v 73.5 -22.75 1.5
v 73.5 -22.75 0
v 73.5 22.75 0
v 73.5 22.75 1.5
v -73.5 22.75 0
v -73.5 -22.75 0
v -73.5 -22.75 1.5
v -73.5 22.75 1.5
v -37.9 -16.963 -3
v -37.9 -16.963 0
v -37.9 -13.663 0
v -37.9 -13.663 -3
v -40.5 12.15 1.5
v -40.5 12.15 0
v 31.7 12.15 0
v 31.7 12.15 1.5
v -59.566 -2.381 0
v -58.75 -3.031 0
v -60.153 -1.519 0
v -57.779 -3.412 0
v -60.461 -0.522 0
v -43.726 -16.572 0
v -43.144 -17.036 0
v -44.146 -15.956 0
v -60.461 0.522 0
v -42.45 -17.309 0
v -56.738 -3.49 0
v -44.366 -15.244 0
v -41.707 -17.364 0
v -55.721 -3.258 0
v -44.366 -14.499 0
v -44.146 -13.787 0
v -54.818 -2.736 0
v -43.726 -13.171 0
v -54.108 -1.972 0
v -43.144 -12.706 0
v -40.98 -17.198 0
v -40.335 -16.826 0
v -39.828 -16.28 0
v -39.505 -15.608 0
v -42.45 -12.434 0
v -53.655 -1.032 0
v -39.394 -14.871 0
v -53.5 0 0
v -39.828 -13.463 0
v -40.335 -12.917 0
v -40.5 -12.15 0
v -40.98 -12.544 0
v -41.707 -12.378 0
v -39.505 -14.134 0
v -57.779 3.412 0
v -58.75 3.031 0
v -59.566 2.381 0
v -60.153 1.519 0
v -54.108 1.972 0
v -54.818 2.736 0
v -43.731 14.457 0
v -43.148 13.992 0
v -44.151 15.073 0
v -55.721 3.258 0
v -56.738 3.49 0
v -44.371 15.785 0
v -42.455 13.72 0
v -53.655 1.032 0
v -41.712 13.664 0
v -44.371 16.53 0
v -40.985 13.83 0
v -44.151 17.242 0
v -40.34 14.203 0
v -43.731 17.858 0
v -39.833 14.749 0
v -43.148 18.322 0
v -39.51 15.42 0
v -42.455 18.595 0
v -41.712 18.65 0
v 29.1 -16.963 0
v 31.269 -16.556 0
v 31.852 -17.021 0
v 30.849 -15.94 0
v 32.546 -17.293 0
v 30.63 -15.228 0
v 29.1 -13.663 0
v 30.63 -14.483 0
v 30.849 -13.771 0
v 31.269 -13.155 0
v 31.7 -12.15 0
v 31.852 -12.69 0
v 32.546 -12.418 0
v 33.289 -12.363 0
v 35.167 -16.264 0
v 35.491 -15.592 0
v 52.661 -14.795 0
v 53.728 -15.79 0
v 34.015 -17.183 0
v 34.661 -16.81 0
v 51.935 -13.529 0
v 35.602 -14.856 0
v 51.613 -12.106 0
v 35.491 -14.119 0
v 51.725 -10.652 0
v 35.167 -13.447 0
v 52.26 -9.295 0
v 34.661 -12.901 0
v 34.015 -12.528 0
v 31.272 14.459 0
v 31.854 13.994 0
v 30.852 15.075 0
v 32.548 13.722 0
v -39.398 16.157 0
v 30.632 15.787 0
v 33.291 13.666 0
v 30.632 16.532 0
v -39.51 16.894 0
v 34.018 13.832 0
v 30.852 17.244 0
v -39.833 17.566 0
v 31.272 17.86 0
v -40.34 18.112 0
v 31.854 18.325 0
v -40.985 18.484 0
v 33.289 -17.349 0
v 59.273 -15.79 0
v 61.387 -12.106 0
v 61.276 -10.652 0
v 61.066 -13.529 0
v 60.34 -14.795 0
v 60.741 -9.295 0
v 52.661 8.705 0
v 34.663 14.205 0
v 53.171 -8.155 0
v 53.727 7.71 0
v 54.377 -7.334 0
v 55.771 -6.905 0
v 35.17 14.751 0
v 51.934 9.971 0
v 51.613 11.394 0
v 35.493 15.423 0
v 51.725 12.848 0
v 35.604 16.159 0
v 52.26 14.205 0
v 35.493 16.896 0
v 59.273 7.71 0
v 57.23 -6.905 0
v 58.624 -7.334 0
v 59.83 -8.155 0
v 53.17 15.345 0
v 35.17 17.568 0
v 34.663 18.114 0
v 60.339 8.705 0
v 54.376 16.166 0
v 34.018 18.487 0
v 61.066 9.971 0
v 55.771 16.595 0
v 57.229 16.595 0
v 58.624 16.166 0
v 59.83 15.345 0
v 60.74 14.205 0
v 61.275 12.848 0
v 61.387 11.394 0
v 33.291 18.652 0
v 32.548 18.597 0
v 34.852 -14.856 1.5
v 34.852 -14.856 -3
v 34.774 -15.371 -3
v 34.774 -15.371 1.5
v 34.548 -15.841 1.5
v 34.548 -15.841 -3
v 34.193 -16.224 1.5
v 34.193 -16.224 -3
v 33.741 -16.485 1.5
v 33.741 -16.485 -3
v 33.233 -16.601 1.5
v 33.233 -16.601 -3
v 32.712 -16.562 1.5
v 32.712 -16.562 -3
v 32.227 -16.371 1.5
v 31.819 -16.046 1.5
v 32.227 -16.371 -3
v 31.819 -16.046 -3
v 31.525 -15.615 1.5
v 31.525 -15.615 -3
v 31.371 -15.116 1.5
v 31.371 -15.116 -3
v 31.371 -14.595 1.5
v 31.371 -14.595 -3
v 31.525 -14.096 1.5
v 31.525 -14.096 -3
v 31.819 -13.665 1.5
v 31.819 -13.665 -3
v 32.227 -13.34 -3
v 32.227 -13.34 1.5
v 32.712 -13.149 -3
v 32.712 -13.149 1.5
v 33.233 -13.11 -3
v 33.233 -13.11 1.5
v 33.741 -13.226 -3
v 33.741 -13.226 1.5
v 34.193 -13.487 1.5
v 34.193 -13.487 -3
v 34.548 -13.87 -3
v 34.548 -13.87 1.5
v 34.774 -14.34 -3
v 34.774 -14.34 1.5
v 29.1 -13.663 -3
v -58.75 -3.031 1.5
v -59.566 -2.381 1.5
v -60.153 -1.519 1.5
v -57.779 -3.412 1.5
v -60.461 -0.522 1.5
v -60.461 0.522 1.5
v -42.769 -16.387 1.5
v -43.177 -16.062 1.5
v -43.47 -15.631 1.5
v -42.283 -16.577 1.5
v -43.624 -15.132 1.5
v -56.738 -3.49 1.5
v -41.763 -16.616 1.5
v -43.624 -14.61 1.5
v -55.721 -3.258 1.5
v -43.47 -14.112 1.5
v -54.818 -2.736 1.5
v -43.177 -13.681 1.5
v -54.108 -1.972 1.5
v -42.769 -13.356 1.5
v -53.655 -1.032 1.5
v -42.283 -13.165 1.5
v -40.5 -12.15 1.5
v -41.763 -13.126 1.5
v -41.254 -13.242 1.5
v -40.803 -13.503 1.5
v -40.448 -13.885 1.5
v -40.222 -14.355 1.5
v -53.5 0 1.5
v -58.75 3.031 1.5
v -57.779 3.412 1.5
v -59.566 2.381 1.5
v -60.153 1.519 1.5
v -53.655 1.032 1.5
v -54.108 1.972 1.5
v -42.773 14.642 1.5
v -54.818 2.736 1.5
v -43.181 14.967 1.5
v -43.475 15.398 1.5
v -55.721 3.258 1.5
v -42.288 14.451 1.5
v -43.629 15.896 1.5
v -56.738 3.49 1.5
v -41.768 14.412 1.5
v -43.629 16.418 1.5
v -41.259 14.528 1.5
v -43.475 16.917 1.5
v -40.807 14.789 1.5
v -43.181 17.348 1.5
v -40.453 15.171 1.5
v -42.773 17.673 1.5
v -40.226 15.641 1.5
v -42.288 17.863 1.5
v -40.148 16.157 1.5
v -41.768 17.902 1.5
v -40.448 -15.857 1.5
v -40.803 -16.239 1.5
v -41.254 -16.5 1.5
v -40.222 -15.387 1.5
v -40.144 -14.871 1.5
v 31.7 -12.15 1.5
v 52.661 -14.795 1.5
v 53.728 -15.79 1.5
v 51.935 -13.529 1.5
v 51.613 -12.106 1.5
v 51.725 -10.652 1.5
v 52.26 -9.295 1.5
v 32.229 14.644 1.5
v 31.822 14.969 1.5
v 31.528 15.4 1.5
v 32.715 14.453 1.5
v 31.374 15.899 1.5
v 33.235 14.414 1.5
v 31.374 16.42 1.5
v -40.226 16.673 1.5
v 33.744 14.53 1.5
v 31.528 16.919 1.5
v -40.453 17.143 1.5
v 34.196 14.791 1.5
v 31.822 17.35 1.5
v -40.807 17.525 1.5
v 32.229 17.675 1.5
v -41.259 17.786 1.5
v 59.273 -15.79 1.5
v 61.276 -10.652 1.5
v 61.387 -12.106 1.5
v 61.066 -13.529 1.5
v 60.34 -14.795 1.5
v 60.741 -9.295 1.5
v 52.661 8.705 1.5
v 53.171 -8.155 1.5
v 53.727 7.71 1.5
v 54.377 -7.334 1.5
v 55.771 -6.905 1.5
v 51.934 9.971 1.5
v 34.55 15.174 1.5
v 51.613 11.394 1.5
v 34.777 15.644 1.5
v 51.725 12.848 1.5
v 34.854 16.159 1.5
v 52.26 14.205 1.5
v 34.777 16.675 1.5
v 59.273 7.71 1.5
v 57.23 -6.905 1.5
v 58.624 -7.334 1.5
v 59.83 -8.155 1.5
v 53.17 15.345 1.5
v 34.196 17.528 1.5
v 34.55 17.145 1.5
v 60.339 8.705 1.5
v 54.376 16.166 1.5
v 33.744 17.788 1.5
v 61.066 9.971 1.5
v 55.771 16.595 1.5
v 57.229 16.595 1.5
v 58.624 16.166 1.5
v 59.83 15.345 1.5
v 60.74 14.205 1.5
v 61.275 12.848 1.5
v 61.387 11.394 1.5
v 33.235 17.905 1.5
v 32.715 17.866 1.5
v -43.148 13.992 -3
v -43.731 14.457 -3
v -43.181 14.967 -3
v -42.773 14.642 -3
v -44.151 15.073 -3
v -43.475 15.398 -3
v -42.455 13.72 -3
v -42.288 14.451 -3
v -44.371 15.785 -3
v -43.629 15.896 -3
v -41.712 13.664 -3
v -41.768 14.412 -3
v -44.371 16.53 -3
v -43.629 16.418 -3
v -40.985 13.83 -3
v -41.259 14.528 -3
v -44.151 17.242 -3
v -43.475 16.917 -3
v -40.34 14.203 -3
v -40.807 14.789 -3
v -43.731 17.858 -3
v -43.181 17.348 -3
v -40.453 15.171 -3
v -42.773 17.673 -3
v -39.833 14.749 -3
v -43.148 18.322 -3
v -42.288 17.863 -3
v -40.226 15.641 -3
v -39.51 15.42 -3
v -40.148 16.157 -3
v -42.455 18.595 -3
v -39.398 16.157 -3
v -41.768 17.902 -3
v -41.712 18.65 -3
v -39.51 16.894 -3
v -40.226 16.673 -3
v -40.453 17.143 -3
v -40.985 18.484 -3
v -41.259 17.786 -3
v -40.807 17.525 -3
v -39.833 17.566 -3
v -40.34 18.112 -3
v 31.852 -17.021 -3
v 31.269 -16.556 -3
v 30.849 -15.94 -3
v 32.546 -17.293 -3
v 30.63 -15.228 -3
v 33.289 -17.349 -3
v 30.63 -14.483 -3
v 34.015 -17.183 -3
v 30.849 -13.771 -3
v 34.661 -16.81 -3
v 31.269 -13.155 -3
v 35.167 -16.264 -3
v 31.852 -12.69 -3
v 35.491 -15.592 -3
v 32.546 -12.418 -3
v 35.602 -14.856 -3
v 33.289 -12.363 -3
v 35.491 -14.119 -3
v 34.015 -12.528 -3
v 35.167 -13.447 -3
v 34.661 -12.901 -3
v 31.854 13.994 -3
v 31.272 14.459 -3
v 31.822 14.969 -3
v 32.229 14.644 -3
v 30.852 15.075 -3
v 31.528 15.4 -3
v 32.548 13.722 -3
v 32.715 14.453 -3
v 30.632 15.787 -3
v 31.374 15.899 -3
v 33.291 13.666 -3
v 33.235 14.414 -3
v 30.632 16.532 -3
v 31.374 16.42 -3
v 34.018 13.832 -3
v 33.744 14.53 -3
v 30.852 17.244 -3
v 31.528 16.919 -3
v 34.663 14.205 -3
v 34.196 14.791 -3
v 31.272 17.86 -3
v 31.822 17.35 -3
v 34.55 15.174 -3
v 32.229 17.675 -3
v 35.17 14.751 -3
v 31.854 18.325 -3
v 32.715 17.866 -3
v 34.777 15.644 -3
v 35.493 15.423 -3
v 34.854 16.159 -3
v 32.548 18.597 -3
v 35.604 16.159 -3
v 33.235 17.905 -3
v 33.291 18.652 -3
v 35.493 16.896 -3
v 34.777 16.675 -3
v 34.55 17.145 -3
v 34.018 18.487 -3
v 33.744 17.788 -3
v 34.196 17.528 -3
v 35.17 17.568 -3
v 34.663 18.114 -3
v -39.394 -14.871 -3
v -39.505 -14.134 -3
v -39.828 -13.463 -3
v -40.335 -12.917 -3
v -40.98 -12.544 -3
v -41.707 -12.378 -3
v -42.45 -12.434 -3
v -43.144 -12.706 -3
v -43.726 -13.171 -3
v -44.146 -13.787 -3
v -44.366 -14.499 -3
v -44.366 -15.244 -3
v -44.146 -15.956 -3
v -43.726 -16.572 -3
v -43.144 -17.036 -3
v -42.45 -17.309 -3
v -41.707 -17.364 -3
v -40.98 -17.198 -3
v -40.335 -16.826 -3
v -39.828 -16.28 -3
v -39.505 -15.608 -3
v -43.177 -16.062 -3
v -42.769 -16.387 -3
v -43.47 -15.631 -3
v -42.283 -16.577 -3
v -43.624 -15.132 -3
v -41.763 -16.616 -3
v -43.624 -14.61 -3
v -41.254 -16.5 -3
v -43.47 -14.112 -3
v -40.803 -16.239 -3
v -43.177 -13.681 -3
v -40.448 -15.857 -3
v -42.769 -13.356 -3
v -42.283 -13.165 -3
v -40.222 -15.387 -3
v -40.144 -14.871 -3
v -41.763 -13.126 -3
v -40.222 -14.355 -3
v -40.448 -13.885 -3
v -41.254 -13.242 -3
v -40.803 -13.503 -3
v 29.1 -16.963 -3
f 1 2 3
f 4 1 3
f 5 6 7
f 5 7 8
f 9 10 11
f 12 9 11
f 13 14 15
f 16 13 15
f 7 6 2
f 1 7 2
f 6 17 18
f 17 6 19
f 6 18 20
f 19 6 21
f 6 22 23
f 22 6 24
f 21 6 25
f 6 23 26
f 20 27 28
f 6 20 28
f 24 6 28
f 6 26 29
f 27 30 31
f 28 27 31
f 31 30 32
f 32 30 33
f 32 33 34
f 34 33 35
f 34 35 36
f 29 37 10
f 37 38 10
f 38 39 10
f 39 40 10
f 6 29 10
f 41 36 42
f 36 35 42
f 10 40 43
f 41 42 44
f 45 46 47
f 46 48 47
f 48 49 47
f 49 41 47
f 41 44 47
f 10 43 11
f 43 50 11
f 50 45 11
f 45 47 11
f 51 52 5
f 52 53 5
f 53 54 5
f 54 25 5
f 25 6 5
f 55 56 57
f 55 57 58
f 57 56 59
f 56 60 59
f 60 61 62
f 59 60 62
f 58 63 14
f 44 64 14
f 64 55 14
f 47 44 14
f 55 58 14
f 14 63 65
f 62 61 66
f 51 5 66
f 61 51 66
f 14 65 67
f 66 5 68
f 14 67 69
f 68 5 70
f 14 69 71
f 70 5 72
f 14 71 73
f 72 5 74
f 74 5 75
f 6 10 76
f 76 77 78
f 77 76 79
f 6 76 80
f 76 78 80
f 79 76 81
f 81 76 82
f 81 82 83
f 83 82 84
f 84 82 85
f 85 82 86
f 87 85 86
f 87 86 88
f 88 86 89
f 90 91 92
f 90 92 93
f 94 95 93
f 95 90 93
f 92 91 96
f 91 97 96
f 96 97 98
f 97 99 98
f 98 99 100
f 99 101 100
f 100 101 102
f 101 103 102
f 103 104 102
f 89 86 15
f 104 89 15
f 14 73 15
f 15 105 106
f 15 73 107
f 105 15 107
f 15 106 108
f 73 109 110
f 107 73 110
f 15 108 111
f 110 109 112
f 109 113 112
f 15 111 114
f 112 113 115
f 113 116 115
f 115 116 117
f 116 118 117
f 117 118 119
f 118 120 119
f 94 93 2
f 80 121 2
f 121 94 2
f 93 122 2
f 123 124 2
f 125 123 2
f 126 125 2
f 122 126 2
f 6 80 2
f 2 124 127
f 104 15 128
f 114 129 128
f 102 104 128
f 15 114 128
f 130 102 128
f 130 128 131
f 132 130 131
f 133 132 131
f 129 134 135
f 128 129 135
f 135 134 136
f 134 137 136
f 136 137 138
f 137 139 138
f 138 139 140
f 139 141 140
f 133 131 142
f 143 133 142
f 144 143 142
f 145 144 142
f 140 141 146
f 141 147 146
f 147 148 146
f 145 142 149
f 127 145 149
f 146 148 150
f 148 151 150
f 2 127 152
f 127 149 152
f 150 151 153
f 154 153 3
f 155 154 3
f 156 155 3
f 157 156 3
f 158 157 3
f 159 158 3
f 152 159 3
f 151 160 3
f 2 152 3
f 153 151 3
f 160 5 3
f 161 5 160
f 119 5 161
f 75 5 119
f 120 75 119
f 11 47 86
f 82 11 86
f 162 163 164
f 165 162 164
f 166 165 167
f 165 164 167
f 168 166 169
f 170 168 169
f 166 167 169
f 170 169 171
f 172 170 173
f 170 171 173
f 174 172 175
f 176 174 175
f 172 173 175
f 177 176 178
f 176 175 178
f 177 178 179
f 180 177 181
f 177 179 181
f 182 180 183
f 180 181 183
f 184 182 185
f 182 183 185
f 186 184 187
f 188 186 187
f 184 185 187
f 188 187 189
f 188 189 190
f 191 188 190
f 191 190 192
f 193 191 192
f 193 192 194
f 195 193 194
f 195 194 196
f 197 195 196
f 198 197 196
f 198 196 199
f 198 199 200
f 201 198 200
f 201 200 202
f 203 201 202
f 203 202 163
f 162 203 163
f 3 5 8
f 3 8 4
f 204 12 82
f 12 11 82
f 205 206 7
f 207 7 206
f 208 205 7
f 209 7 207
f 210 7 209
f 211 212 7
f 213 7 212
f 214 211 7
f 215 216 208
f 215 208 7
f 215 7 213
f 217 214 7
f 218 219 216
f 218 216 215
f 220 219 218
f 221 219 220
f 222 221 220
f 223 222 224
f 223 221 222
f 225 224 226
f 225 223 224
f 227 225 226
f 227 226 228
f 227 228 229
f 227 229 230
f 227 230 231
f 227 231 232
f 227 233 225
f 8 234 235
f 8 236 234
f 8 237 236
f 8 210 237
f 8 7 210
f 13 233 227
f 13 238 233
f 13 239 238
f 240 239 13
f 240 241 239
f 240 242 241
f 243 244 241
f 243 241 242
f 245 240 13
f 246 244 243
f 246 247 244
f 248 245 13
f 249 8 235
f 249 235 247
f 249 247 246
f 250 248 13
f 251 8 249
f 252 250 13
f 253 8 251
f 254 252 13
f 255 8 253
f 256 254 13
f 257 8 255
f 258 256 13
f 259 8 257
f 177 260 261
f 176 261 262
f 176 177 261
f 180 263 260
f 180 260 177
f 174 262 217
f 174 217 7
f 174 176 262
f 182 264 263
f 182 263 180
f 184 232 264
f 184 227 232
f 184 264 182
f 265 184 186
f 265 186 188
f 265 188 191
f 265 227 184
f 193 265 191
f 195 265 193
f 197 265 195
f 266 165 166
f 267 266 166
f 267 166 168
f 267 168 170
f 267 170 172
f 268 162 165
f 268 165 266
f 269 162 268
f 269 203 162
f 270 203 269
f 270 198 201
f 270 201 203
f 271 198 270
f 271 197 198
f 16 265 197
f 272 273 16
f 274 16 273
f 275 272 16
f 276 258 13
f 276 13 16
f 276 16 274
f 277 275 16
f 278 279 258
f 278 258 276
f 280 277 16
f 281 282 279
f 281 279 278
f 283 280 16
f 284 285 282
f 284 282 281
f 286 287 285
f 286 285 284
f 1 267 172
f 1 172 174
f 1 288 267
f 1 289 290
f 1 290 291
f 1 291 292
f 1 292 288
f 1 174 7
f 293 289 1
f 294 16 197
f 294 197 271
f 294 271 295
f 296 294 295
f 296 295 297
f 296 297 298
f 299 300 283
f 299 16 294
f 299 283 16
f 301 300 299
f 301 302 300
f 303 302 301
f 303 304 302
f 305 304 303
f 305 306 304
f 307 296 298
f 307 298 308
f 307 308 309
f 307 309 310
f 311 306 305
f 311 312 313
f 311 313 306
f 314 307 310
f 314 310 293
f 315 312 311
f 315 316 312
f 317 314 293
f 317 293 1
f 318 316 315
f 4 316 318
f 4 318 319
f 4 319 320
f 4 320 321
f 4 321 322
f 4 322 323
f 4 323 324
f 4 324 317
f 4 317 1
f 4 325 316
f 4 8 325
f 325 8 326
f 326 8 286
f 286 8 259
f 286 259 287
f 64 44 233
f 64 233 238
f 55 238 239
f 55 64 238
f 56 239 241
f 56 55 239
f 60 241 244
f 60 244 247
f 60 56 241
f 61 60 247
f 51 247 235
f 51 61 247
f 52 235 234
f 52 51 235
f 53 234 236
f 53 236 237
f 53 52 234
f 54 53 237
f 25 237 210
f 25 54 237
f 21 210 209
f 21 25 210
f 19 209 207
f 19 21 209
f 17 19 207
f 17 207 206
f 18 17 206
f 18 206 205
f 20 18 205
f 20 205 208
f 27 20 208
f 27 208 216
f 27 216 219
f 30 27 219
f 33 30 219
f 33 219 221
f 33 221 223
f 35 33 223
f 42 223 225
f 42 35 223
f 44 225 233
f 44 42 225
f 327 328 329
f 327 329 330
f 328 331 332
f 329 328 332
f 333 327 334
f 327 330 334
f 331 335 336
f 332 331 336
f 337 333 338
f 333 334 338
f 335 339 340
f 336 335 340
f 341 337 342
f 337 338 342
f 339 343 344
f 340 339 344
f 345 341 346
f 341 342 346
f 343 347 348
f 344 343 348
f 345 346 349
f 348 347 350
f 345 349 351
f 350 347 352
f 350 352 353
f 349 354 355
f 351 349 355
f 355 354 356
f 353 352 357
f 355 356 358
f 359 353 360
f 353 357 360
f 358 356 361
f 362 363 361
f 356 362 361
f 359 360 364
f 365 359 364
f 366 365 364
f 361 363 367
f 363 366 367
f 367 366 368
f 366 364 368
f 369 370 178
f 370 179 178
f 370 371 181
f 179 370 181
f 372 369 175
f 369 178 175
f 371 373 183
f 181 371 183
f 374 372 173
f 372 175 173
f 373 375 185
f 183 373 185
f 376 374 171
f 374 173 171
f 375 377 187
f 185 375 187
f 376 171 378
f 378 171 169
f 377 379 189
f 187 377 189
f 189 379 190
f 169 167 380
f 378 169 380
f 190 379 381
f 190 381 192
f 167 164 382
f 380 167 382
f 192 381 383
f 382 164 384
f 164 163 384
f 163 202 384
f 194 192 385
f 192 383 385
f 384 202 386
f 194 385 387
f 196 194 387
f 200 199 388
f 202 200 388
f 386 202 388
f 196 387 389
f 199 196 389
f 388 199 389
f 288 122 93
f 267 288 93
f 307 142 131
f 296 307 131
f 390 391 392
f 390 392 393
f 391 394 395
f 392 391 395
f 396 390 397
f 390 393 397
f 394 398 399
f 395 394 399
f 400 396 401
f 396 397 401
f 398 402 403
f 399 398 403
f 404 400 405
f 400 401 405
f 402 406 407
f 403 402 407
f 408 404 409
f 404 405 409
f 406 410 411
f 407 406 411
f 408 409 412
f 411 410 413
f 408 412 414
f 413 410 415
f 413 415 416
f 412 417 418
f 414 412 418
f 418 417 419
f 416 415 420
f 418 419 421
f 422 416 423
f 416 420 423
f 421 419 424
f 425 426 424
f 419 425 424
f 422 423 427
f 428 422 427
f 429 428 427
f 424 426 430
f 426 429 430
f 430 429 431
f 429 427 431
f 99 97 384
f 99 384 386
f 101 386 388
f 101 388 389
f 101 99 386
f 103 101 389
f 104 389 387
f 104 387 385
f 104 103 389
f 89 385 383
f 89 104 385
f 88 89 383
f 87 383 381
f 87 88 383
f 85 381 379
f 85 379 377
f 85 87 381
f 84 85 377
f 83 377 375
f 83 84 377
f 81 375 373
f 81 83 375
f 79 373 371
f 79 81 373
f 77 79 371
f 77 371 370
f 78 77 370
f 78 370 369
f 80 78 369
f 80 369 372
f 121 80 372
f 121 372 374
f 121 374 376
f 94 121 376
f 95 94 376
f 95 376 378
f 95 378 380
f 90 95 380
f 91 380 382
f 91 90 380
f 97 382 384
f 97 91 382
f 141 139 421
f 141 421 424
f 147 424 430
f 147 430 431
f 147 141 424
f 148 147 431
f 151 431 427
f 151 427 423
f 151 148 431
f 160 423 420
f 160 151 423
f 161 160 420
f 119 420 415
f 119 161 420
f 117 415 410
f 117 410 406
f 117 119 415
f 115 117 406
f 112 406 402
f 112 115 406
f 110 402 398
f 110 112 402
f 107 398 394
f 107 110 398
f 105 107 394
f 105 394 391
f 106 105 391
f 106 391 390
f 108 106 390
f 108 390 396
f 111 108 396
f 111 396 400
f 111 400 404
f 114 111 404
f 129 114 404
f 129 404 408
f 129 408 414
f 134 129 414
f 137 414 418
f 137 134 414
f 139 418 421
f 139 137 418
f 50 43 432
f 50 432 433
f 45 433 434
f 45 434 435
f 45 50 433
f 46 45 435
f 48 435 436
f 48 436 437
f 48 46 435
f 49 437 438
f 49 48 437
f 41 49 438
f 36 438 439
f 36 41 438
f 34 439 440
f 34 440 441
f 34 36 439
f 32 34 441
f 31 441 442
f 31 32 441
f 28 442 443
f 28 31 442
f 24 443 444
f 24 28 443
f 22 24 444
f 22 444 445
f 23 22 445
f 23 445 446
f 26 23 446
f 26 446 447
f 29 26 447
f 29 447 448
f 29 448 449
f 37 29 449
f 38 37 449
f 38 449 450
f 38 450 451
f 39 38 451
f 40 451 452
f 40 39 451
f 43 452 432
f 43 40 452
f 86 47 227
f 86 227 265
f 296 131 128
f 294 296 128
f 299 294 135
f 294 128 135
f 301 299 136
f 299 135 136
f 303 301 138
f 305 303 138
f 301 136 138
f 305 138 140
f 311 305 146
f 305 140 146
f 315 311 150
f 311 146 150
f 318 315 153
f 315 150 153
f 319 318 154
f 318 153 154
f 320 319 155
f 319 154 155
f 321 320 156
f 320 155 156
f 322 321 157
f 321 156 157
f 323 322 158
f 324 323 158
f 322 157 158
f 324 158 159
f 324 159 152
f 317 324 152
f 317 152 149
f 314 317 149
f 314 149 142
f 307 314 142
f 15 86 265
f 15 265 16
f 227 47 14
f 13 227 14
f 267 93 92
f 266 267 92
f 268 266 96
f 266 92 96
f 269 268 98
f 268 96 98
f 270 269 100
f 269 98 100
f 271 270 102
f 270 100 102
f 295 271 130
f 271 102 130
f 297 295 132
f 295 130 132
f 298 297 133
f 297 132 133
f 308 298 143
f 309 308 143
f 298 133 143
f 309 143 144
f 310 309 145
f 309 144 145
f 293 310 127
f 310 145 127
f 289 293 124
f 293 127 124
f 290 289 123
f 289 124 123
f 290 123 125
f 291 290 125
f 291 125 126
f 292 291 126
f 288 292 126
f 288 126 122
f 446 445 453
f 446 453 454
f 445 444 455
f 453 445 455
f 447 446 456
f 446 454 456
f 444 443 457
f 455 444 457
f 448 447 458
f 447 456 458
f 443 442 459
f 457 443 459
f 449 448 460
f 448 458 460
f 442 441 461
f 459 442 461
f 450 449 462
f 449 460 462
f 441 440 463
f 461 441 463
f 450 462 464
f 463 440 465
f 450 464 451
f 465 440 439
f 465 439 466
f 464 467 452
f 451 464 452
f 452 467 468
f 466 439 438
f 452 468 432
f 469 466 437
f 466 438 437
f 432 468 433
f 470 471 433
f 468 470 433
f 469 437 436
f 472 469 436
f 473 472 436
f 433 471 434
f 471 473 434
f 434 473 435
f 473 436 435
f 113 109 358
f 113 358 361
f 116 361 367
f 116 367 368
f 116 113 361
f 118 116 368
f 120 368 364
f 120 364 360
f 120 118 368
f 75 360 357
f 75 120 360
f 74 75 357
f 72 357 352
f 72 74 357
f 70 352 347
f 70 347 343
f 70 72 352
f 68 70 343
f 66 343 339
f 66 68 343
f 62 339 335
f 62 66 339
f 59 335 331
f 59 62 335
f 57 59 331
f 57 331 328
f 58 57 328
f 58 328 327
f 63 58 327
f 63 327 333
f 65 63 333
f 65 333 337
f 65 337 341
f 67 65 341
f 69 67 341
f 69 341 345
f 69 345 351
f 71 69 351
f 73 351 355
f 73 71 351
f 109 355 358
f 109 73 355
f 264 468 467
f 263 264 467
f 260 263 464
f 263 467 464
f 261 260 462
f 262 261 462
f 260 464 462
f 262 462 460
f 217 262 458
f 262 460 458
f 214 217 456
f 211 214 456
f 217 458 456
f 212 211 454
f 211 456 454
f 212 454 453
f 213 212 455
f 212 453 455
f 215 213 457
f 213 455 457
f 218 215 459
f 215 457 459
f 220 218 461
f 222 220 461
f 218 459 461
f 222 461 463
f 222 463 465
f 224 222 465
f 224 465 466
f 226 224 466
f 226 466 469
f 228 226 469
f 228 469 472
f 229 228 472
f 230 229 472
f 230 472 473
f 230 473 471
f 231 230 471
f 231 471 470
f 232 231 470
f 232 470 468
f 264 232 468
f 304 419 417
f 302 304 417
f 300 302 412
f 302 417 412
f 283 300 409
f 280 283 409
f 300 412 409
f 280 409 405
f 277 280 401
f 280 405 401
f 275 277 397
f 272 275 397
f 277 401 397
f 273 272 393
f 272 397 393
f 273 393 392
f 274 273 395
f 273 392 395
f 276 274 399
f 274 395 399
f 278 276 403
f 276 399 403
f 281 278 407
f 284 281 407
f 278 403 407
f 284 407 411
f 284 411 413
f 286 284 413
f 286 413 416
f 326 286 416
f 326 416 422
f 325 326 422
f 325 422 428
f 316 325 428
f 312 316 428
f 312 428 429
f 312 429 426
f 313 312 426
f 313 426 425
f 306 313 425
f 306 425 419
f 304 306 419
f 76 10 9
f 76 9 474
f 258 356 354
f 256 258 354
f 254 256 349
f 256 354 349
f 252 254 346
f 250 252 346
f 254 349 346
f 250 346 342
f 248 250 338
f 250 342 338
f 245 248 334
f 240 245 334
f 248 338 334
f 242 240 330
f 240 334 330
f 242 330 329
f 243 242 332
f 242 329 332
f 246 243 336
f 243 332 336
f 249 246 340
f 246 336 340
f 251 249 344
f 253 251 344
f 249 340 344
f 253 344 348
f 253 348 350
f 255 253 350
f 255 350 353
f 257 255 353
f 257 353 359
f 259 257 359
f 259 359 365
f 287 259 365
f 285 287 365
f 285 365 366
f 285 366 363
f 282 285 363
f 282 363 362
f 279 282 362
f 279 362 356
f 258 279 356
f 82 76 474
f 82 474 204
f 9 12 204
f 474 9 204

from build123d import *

# Parameters (mm, degrees)
F0_W      = 147
F0_H      = 45.5
F0_W_2    = 67
F0_H_2    = 3.3
F0_R      = 3.5
F0_W_3    = 72.2
F0_H_3    = 24.3
F1_DEPTH  = 1.5
F2_DEPTH  = 1.5
F3_DEPTH  = 1.5
F4_DEPTH  = 1.5
F5_DEPTH  = 1.5
F6_R      = 2.5
F7_DEPTH  = 3
F8_R      = 1.75
F9_DEPTH  = 6
F10_R     = 2.5
F11_DEPTH = 3
F12_R     = 1.75
F13_DEPTH = 25
F14_R     = 2.5
F15_DEPTH = 3
F16_R     = 1.75
F17_DEPTH = 25
F18_R     = 2.5
F19_DEPTH = 3
F20_R     = 1.75
F21_DEPTH = 25


with BuildPart() as f1:
    # F0 (on Top) → F1 (new body)
    with BuildSketch(Plane.XY):
        Rectangle(F0_W, F0_H)
        with Locations((-4.4, -15.3125505805)):
            Rectangle(F0_W_2, F0_H_2, mode=Mode.SUBTRACT)
        with BuildLine():
            ThreePointArc((53.7276520505, -15.79), (56.5004484729, -6.85), (59.2732448953, -15.79))
            Line((59.2732448953, -15.79), (53.7276520505, -15.79))
        make_face(mode=Mode.SUBTRACT)
        with Locations((-57, 0)):
            Circle(F0_R, mode=Mode.SUBTRACT)
        with Locations((-4.4, 0)):
            Rectangle(F0_W_3, F0_H_3, mode=Mode.SUBTRACT)
        with BuildLine():
            ThreePointArc((53.7272035776, 7.71), (56.5, 16.65), (59.2727964224, 7.71))
            Line((59.2727964224, 7.71), (53.7272035776, 7.71))
        make_face(mode=Mode.SUBTRACT)
    extrude(amount=F1_DEPTH)

    # F0 (on Top) → F2 (join)
    with BuildSketch(Plane.XY):
        Rectangle(F0_W, F0_H)
        with Locations((-4.4, -15.3125505805)):
            Rectangle(F0_W_2, F0_H_2, mode=Mode.SUBTRACT)
        with BuildLine():
            ThreePointArc((53.7276520505, -15.79), (56.5004484729, -6.85), (59.2732448953, -15.79))
            Line((59.2732448953, -15.79), (53.7276520505, -15.79))
        make_face(mode=Mode.SUBTRACT)
        with Locations((-57, 0)):
            Circle(F0_R, mode=Mode.SUBTRACT)
        with Locations((-4.4, 0)):
            Rectangle(F0_W_3, F0_H_3, mode=Mode.SUBTRACT)
        with BuildLine():
            ThreePointArc((53.7272035776, 7.71), (56.5, 16.65), (59.2727964224, 7.71))
            Line((59.2727964224, 7.71), (53.7272035776, 7.71))
        make_face(mode=Mode.SUBTRACT)
    extrude(amount=F2_DEPTH)

    # F0 (on Top) → F3 (join)
    with BuildSketch(Plane.XY):
        Rectangle(F0_W, F0_H)
        with Locations((-4.4, -15.3125505805)):
            Rectangle(F0_W_2, F0_H_2, mode=Mode.SUBTRACT)
        with BuildLine():
            ThreePointArc((53.7276520505, -15.79), (56.5004484729, -6.85), (59.2732448953, -15.79))
            Line((59.2732448953, -15.79), (53.7276520505, -15.79))
        make_face(mode=Mode.SUBTRACT)
        with Locations((-57, 0)):
            Circle(F0_R, mode=Mode.SUBTRACT)
        with Locations((-4.4, 0)):
            Rectangle(F0_W_3, F0_H_3, mode=Mode.SUBTRACT)
        with BuildLine():
            ThreePointArc((53.7272035776, 7.71), (56.5, 16.65), (59.2727964224, 7.71))
            Line((59.2727964224, 7.71), (53.7272035776, 7.71))
        make_face(mode=Mode.SUBTRACT)
    extrude(amount=F3_DEPTH)

    # F0 (on Top) → F4 (join, symmetric)
    with BuildSketch(Plane.XY):
        with Locations((-4.4, -15.3125505805)):
            Rectangle(F0_W_2, F0_H_2)
    extrude(amount=F4_DEPTH, both=True)

    # F5 (add): a face of the model
    f5_faces = [f1.faces().sort_by_distance(p)[0] for p in [
        (-4.4, -15.3125505805, -1.5),
    ]]
    extrude(f5_faces, amount=F5_DEPTH)

    # F6 (on face) → F7 (join)
    with BuildSketch(Plane.XY):
        with Locations((33.1043936312, 16.1594673991)):
            Circle(F6_R)
    extrude(amount=-F7_DEPTH)

    # F8 (on face) → F9 (cut)
    with BuildSketch(Plane(origin=(0, 0, -3), x_dir=(1, 0, 0), z_dir=(0, 0, -1))):
        with Locations((33.1043936312, -16.1594673991)):
            Circle(F8_R)
    extrude(amount=-F9_DEPTH, mode=Mode.SUBTRACT)

    # F10 (on face) → F11 (join)
    with BuildSketch(Plane.XY):
        with Locations((-41.8984927237, 16.1572918296)):
            Circle(F10_R)
    extrude(amount=-F11_DEPTH)

    # F12 (on face) → F13 (cut)
    with BuildSketch(Plane(origin=(0, 0, -3), x_dir=(1, 0, 0), z_dir=(0, 0, -1))):
        with Locations((-41.8984927237, -16.1572918296)):
            Circle(F12_R)
    extrude(amount=-F13_DEPTH, mode=Mode.SUBTRACT)

    # F14 (on face) → F15 (join)
    with BuildSketch(Plane.XY):
        with Locations((-41.893761605, -14.8712657392)):
            Circle(F14_R)
    extrude(amount=-F15_DEPTH)

    # F16 (on face) → F17 (cut)
    with BuildSketch(Plane(origin=(0, 0, -3), x_dir=(1, 0, 0), z_dir=(0, 0, -1))):
        with Locations((-41.893761605, 14.8712657392)):
            Circle(F16_R)
    extrude(amount=-F17_DEPTH, mode=Mode.SUBTRACT)

    # F18 (on face) → F19 (join)
    with BuildSketch(Plane.XY):
        with Locations((33.1018306315, -14.8555124179)):
            Circle(F18_R)
    extrude(amount=-F19_DEPTH)

    # F20 (on face) → F21 (cut)
    with BuildSketch(Plane(origin=(0, 0, -3), x_dir=(1, 0, 0), z_dir=(0, 0, -1))):
        with Locations((33.1018306315, 14.8555124179)):
            Circle(F20_R)
    extrude(amount=-F21_DEPTH, mode=Mode.SUBTRACT)


solid = f1.part
